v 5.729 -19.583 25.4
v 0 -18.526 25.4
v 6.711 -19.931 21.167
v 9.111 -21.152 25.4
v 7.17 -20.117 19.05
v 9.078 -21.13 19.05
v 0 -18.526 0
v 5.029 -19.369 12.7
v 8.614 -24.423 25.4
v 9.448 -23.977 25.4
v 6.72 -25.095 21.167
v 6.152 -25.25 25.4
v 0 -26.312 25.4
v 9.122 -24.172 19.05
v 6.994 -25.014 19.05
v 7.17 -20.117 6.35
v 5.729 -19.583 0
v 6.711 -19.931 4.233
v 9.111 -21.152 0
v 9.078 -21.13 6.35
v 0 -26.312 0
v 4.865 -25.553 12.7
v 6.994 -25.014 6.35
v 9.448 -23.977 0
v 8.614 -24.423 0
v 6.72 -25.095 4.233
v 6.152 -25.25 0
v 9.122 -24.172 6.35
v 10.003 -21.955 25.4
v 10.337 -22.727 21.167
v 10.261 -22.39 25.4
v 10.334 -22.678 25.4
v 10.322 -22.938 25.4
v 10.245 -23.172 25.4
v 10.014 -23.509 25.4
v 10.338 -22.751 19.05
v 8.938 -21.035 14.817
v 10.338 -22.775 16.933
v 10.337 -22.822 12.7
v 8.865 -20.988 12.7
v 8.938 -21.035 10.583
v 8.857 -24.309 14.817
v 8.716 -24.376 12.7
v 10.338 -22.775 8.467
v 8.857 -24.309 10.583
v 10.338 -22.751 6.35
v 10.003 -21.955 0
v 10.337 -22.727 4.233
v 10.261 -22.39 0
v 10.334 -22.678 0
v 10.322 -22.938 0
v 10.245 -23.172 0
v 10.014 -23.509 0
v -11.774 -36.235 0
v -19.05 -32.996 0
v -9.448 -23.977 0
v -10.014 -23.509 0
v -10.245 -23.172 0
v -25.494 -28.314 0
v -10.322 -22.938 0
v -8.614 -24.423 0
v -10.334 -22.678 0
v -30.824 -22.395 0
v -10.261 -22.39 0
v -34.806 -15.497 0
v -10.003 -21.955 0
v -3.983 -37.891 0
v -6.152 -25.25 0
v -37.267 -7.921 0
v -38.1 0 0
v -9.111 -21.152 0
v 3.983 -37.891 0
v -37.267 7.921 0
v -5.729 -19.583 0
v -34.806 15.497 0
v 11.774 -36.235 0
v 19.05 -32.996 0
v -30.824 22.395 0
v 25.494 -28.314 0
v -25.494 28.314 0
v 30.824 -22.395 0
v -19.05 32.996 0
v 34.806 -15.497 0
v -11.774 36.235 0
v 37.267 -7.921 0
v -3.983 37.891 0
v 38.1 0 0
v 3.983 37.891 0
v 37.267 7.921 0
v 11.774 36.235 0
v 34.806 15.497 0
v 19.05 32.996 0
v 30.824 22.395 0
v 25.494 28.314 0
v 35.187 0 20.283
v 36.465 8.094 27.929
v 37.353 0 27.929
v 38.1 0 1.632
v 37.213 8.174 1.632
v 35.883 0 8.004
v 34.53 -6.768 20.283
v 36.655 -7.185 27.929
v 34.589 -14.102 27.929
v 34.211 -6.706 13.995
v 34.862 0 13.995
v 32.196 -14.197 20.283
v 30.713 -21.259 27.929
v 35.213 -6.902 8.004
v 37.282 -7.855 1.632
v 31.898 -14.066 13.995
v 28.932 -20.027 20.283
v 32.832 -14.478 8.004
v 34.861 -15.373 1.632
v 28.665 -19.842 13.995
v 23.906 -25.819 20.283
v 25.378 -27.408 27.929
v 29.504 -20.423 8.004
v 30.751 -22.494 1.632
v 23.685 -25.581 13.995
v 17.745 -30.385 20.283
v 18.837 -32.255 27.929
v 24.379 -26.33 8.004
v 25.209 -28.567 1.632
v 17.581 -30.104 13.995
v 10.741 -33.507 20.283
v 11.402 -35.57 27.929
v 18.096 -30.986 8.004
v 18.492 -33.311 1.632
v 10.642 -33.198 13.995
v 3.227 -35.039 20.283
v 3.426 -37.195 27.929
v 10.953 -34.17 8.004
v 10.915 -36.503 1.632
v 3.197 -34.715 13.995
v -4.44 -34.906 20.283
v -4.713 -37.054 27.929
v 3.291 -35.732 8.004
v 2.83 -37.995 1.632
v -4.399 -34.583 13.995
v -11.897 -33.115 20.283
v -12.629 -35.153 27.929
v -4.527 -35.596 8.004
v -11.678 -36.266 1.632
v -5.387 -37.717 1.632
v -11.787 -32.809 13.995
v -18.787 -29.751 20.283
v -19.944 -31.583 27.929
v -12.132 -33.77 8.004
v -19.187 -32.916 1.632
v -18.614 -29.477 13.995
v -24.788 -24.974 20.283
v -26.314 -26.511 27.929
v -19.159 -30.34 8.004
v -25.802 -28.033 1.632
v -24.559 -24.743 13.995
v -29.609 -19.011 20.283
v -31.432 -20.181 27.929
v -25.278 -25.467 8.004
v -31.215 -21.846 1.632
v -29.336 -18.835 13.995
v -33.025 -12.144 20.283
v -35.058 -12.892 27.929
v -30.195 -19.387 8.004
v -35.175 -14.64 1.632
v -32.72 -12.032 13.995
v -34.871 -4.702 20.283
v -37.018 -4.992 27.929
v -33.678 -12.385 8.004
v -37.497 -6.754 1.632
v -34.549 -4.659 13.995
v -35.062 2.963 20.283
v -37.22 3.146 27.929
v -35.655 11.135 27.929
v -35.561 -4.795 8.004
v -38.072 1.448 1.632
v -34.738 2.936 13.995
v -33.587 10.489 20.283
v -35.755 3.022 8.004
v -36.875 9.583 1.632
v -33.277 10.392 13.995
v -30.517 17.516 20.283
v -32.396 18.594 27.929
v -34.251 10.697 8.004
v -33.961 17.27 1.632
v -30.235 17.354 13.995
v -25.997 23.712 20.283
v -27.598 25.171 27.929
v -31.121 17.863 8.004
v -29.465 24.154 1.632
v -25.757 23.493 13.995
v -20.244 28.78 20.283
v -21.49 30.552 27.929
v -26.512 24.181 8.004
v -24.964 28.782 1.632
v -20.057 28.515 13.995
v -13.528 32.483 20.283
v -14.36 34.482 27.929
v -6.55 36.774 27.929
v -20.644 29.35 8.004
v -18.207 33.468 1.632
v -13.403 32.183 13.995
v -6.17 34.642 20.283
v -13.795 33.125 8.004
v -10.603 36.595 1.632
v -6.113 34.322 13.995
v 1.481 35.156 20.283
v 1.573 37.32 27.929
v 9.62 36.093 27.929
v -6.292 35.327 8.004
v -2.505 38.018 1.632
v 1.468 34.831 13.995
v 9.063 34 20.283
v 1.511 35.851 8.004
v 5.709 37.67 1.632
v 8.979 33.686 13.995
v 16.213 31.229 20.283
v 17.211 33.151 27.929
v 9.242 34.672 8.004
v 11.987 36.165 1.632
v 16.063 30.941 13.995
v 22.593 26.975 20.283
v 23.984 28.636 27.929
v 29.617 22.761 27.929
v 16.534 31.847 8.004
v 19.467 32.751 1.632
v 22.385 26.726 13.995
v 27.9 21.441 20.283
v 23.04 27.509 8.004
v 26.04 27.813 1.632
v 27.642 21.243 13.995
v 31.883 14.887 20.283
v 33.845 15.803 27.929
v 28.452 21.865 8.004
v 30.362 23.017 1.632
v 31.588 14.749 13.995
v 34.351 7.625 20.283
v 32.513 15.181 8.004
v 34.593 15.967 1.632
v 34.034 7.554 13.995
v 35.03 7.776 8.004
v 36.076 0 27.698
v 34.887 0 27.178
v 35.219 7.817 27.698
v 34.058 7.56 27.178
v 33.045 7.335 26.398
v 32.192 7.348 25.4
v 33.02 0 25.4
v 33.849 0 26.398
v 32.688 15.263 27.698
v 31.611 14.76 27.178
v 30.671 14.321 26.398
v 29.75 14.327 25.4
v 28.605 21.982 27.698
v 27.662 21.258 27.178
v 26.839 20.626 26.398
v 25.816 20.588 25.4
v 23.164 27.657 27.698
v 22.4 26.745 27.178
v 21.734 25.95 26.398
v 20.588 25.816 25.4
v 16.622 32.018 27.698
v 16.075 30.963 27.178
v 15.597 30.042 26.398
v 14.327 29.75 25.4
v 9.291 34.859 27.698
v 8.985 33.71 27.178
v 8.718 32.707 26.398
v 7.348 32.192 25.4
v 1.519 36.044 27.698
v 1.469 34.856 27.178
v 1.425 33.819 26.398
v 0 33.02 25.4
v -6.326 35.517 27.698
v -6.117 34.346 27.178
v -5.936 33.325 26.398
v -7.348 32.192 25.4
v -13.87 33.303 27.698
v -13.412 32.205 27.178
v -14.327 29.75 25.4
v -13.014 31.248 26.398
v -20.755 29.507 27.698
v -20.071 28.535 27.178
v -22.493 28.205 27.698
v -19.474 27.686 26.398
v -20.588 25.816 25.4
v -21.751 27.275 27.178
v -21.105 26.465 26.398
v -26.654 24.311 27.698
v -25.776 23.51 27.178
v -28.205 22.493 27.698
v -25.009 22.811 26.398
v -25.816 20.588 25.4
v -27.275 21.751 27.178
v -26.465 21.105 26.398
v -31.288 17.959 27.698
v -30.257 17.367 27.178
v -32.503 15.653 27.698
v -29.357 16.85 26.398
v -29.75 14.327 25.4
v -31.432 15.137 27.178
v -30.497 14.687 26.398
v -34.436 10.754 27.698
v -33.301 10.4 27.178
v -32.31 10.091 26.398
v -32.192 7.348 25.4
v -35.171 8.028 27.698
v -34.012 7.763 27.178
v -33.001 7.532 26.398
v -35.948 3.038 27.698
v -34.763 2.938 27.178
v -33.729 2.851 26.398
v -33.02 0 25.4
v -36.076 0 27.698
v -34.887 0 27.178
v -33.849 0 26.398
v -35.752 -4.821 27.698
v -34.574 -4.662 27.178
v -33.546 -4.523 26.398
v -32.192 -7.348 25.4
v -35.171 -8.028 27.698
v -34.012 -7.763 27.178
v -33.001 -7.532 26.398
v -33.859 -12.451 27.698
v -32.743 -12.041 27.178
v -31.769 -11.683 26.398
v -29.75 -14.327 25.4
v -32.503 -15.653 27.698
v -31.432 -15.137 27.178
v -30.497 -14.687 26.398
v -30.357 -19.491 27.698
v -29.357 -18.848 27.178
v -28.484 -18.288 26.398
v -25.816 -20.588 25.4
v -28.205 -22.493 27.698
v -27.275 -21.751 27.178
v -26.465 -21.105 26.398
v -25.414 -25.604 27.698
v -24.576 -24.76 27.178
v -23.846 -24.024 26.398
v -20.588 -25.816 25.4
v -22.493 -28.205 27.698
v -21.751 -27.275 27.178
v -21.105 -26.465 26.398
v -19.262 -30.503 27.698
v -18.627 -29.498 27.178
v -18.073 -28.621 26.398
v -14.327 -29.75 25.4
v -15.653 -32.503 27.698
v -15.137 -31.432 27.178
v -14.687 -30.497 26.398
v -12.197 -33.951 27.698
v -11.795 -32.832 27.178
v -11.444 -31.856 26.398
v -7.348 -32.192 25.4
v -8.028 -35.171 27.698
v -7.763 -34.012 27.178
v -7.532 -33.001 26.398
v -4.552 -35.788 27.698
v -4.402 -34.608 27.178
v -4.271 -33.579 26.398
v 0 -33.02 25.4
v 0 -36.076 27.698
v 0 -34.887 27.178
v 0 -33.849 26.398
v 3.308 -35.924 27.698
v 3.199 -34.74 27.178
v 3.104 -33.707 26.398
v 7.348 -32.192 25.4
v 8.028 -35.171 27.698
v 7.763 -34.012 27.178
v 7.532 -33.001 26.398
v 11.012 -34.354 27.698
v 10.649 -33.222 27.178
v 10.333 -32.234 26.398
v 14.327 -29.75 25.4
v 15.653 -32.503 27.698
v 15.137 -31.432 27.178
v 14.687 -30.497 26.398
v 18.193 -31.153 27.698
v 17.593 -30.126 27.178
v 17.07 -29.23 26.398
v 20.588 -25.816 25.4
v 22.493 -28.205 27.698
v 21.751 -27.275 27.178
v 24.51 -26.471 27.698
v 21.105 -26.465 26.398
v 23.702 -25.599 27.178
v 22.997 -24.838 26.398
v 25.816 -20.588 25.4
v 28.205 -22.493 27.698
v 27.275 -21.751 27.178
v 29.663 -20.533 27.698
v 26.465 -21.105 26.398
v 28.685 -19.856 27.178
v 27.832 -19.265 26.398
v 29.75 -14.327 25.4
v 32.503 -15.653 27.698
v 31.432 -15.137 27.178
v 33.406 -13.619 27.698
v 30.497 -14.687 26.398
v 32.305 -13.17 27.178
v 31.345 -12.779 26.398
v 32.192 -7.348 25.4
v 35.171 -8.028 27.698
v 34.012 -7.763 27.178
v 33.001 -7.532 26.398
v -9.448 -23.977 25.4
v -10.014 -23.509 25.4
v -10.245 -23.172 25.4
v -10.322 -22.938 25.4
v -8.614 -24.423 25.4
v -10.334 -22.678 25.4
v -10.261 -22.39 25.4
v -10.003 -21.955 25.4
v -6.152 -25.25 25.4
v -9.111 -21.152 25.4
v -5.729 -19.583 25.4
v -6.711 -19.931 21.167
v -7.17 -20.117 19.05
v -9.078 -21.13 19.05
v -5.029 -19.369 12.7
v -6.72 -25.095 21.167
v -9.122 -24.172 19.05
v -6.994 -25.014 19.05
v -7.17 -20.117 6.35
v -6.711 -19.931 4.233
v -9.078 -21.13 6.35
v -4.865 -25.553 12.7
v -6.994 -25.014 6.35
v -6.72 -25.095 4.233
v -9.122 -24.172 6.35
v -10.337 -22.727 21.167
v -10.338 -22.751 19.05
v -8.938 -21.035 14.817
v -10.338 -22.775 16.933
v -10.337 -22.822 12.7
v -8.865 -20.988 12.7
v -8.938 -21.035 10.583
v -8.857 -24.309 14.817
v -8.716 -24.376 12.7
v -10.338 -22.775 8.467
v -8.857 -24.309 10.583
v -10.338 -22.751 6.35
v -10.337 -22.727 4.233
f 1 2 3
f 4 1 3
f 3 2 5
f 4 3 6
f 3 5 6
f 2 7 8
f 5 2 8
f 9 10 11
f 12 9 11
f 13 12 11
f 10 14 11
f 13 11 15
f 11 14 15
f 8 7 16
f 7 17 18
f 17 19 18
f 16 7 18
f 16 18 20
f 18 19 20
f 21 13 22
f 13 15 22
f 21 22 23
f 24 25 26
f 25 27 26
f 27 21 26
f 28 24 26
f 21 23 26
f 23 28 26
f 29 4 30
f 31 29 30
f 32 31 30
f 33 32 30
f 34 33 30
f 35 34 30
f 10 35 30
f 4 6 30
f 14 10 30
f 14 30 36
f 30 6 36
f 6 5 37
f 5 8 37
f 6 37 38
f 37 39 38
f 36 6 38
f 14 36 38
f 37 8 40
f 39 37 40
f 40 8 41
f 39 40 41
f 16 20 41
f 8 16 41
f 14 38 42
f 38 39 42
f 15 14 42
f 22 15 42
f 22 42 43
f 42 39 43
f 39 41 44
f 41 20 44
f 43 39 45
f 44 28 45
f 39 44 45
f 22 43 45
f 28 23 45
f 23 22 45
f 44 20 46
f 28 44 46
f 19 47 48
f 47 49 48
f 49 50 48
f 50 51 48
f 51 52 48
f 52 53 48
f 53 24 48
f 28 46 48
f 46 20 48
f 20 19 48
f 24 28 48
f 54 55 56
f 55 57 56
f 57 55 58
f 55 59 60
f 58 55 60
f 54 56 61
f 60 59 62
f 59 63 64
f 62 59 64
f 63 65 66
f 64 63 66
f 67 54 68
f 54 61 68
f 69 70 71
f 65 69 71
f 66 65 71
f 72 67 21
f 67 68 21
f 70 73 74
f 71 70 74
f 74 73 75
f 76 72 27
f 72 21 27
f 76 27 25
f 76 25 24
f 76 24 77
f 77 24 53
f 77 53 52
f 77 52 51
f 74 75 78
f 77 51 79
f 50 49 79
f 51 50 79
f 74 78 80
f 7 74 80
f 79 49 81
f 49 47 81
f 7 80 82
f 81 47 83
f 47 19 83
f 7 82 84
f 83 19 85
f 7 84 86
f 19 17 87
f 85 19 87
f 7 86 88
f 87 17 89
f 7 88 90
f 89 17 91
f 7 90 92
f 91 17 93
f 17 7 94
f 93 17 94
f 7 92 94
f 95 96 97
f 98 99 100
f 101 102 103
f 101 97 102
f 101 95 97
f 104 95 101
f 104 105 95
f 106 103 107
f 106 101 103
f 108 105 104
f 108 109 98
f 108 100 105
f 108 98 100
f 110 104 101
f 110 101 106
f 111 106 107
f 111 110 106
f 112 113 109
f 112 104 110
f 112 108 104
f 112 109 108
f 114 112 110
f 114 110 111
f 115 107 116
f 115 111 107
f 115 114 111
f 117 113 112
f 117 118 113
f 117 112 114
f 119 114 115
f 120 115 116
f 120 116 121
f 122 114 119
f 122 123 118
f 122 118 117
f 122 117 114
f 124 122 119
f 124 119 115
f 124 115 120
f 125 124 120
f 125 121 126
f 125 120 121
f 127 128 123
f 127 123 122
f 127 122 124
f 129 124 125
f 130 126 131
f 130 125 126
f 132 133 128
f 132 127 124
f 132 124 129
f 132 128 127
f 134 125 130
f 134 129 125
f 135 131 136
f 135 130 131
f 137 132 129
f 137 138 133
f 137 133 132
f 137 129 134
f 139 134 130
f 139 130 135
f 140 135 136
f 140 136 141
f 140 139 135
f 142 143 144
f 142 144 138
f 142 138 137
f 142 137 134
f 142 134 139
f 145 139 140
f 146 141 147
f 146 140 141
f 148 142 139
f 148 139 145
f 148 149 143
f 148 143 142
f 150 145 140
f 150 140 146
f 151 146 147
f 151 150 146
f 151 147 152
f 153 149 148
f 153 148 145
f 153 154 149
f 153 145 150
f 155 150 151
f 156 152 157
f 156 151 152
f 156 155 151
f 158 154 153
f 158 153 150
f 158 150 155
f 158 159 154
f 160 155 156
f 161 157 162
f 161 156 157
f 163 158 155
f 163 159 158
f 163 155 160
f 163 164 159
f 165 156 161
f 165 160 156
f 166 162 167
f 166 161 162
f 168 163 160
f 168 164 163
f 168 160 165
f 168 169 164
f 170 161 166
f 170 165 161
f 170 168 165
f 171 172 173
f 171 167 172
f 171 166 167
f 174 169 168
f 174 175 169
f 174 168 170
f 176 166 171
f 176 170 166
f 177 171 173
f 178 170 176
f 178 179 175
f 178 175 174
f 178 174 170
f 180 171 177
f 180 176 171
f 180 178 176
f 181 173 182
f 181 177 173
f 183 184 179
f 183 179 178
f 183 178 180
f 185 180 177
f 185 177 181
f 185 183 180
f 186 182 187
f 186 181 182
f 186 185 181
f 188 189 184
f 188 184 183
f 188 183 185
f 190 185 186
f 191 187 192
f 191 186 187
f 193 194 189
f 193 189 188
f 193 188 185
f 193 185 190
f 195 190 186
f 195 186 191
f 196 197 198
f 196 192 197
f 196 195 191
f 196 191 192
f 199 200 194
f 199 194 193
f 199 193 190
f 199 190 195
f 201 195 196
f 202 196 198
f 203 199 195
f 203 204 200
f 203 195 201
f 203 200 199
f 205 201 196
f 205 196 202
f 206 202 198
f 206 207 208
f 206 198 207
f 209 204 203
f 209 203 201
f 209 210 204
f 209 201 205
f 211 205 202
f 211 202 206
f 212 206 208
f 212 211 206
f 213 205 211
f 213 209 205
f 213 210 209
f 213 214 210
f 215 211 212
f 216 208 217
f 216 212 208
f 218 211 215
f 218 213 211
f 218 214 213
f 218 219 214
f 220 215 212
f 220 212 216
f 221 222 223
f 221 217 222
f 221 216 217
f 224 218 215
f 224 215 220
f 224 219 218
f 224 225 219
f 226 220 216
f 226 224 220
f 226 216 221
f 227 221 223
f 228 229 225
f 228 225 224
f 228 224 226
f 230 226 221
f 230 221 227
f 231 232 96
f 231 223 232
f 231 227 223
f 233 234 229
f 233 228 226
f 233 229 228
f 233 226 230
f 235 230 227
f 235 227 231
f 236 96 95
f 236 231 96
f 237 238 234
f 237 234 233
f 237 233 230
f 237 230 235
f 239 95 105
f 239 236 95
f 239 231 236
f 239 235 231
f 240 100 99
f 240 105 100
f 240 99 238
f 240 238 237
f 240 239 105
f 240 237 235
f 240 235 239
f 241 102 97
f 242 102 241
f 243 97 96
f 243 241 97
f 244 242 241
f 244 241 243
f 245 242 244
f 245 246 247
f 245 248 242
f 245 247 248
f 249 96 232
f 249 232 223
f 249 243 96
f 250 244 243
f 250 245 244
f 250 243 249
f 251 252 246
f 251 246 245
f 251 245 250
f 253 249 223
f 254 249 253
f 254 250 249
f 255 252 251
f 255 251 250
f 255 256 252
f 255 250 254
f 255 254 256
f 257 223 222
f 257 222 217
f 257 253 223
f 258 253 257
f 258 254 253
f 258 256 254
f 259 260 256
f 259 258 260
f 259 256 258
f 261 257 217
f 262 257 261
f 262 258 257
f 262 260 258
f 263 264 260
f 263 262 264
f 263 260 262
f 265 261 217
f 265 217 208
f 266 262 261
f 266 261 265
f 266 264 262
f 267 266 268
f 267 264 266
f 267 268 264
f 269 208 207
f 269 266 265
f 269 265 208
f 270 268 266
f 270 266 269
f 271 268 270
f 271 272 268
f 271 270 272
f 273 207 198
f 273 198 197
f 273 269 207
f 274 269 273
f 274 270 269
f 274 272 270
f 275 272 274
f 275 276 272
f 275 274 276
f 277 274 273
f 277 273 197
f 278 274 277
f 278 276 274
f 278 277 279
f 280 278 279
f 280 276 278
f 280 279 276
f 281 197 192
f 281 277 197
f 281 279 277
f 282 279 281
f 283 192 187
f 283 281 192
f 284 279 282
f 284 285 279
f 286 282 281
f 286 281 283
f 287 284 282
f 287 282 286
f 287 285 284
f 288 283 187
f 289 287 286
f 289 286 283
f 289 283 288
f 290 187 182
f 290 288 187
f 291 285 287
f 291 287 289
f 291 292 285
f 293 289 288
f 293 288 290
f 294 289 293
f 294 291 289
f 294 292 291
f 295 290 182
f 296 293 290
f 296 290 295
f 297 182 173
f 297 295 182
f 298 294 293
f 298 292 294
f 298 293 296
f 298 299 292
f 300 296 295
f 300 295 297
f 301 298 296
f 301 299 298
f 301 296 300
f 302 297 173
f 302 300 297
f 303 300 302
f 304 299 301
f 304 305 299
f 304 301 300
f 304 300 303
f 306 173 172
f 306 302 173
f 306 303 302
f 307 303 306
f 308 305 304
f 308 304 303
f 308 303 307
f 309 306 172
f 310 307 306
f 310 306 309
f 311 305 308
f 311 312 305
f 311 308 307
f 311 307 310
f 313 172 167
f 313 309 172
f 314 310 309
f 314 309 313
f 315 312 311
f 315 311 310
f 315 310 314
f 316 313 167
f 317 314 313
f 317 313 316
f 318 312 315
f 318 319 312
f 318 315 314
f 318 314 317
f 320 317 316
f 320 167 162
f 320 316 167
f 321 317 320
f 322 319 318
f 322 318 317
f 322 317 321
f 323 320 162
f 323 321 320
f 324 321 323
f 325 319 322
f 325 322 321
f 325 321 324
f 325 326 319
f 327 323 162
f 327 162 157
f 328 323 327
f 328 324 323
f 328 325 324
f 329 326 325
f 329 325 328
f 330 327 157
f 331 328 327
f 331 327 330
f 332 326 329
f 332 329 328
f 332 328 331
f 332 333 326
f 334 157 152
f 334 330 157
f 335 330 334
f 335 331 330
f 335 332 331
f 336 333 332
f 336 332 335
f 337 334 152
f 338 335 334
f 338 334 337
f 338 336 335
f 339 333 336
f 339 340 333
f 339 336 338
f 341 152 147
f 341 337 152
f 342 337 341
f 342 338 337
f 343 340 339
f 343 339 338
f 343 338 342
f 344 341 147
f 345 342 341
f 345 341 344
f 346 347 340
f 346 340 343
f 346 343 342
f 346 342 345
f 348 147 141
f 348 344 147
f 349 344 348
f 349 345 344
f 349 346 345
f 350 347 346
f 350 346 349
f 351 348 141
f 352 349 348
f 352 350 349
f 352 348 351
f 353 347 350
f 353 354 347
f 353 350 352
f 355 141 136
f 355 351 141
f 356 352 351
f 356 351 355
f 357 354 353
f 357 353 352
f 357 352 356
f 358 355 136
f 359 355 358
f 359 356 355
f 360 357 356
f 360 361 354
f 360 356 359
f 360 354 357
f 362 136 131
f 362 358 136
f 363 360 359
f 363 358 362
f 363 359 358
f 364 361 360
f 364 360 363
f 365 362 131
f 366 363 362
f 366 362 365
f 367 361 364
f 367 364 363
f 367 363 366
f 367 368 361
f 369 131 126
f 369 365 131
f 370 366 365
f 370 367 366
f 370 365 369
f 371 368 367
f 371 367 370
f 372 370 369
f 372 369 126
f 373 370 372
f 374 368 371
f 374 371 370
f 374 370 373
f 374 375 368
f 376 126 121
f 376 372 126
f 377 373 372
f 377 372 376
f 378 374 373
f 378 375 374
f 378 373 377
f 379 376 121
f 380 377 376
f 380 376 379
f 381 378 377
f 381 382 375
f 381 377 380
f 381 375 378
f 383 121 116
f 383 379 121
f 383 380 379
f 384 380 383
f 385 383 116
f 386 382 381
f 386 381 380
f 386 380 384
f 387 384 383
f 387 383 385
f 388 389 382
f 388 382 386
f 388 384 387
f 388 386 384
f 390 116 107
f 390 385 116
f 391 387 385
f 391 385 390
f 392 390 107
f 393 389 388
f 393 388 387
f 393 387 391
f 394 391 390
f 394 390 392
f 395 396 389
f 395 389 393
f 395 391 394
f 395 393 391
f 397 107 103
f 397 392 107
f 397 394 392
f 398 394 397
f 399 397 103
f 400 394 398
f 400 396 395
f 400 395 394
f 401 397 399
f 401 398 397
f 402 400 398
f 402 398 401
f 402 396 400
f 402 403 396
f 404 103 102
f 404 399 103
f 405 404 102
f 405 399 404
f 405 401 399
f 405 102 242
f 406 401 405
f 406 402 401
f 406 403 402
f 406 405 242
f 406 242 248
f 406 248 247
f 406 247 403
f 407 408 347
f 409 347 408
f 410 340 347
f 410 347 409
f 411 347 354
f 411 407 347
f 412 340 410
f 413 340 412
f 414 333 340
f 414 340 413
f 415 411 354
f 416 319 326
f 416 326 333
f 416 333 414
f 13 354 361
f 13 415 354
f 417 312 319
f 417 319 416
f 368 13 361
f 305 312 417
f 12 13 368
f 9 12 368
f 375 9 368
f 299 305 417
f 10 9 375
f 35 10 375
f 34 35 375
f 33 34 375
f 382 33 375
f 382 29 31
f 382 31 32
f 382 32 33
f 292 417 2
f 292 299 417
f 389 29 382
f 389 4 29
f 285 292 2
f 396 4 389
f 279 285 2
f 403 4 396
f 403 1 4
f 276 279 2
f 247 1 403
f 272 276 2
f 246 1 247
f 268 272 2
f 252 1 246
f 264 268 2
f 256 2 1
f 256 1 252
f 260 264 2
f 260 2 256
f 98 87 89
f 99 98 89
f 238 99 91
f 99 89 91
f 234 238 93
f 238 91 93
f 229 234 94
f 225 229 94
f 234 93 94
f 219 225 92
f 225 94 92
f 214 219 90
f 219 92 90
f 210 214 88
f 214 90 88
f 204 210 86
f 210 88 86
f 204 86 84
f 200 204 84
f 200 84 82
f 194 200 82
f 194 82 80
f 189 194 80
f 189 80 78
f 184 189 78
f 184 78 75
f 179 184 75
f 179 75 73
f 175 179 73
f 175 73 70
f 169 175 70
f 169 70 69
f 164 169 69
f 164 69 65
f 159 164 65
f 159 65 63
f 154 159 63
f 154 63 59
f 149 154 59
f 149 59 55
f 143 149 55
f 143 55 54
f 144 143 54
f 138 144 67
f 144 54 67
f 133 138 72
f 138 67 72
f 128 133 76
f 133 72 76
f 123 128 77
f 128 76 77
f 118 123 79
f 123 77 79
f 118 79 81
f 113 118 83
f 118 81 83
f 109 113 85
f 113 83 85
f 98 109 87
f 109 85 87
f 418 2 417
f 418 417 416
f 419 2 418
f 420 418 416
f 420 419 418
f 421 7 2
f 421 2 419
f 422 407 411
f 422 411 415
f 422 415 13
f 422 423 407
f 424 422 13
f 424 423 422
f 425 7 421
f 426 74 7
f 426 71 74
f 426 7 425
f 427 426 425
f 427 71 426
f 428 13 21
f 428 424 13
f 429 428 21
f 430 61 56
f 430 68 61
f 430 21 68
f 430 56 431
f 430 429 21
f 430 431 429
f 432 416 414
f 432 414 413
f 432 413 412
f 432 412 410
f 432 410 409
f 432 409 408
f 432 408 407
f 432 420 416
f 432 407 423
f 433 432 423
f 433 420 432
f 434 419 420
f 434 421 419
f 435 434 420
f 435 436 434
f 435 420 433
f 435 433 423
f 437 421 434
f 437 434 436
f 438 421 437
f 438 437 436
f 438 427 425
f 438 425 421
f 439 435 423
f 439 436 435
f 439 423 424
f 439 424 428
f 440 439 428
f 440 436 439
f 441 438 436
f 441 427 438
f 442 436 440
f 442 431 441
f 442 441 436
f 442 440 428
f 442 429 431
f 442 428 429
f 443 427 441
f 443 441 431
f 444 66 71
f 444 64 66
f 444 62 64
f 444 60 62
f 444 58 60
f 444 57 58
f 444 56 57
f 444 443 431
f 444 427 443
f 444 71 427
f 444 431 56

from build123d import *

# Parameters (mm, degrees)
F0_R     = 38.1
F0_R_2   = 33.02
F1_DEPTH = 27.94
F2_DEPTH = 25.4


# Not quite as in the source:
# - a fillet or chamfer that OpenCascade refuses, or shapes differently, is made with other operations: its cross-section is extruded or revolved along the edge and cut away or added


with BuildPart() as f1:
    # F0 (on Top) → F1 (new body)
    with BuildSketch(Plane.XY):
        Circle(F0_R)
        Circle(F0_R_2, mode=Mode.SUBTRACT)
    extrude(amount=F1_DEPTH)

    # F0 (on Top) → F2 (join)
    with BuildSketch(Plane.XY):
        Circle(F0_R_2)
        with BuildLine():
            add(Edge.make_bspline(
                [(0, -18.5258053243), (-5.2355541848, -18.7942963094), (-15.57457148, -23.313863117), (-4.9670636654, -25.775032118), (0, -26.312014088)],
                knots=[0, 0, 0, 0, 0.5032090963, 1, 1, 1, 1], degree=3))
            add(Edge.make_bspline(
                [(0, -18.5258053243), (5.2355541848, -18.7942963094), (15.57457148, -23.313863117), (4.9670636654, -25.775032118), (0, -26.312014088)],
                knots=[0, 0, 0, 0, 0.5032090963, 1, 1, 1, 1], degree=3))
        make_face(mode=Mode.SUBTRACT)
    extrude(amount=F2_DEPTH)

    # F3: fillet of radius 5.588 on 1 edges, made by hand

    # F3_s1 → F3_t2 (revolve, cut)
    with BuildSketch(Plane.XZ):
        with BuildLine():
            ThreePointArc((37.7035285843, 27.94), (35.03955411, 27.2641262199), (33.02, 25.4))
            Line((33.02, 25.4), (32.9263294283, 25.46096))
            ThreePointArc((32.9263294283, 25.46096), (32.90824, 26.67), (32.90824, 27.94))
            Line((32.90824, 27.94), (33.02, 28.05176))
            Line((33.02, 28.05176), (37.7035285843, 28.05176))
            Line((37.7035285843, 28.05176), (37.7035285843, 27.94))
        make_face()
    revolve(axis=Axis((0, 0, 27.94), (0, 0, 1)), mode=Mode.SUBTRACT)

    # F4 (on Front) → F5 (revolve, cut)
    with BuildSketch(Plane.XZ):
        with BuildLine():
            Line((38.7967936695, 0), (38.3886620402, 30.4337646812))
            add(Edge.make_bspline(
                [(38.3886620402, 30.4337646812), (33.1585071981, 18.5258053243), (33.9639782906, 11.0080875456), (38.7967936695, 0)],
                knots=[0, 0, 0, 0, 30.4365011803, 30.4365011803, 30.4365011803, 30.4365011803], degree=3))
        make_face()
    revolve(axis=Axis((0, 0, 6.5780002624), (0, 0, -1)), mode=Mode.SUBTRACT)


solid = f1.part
